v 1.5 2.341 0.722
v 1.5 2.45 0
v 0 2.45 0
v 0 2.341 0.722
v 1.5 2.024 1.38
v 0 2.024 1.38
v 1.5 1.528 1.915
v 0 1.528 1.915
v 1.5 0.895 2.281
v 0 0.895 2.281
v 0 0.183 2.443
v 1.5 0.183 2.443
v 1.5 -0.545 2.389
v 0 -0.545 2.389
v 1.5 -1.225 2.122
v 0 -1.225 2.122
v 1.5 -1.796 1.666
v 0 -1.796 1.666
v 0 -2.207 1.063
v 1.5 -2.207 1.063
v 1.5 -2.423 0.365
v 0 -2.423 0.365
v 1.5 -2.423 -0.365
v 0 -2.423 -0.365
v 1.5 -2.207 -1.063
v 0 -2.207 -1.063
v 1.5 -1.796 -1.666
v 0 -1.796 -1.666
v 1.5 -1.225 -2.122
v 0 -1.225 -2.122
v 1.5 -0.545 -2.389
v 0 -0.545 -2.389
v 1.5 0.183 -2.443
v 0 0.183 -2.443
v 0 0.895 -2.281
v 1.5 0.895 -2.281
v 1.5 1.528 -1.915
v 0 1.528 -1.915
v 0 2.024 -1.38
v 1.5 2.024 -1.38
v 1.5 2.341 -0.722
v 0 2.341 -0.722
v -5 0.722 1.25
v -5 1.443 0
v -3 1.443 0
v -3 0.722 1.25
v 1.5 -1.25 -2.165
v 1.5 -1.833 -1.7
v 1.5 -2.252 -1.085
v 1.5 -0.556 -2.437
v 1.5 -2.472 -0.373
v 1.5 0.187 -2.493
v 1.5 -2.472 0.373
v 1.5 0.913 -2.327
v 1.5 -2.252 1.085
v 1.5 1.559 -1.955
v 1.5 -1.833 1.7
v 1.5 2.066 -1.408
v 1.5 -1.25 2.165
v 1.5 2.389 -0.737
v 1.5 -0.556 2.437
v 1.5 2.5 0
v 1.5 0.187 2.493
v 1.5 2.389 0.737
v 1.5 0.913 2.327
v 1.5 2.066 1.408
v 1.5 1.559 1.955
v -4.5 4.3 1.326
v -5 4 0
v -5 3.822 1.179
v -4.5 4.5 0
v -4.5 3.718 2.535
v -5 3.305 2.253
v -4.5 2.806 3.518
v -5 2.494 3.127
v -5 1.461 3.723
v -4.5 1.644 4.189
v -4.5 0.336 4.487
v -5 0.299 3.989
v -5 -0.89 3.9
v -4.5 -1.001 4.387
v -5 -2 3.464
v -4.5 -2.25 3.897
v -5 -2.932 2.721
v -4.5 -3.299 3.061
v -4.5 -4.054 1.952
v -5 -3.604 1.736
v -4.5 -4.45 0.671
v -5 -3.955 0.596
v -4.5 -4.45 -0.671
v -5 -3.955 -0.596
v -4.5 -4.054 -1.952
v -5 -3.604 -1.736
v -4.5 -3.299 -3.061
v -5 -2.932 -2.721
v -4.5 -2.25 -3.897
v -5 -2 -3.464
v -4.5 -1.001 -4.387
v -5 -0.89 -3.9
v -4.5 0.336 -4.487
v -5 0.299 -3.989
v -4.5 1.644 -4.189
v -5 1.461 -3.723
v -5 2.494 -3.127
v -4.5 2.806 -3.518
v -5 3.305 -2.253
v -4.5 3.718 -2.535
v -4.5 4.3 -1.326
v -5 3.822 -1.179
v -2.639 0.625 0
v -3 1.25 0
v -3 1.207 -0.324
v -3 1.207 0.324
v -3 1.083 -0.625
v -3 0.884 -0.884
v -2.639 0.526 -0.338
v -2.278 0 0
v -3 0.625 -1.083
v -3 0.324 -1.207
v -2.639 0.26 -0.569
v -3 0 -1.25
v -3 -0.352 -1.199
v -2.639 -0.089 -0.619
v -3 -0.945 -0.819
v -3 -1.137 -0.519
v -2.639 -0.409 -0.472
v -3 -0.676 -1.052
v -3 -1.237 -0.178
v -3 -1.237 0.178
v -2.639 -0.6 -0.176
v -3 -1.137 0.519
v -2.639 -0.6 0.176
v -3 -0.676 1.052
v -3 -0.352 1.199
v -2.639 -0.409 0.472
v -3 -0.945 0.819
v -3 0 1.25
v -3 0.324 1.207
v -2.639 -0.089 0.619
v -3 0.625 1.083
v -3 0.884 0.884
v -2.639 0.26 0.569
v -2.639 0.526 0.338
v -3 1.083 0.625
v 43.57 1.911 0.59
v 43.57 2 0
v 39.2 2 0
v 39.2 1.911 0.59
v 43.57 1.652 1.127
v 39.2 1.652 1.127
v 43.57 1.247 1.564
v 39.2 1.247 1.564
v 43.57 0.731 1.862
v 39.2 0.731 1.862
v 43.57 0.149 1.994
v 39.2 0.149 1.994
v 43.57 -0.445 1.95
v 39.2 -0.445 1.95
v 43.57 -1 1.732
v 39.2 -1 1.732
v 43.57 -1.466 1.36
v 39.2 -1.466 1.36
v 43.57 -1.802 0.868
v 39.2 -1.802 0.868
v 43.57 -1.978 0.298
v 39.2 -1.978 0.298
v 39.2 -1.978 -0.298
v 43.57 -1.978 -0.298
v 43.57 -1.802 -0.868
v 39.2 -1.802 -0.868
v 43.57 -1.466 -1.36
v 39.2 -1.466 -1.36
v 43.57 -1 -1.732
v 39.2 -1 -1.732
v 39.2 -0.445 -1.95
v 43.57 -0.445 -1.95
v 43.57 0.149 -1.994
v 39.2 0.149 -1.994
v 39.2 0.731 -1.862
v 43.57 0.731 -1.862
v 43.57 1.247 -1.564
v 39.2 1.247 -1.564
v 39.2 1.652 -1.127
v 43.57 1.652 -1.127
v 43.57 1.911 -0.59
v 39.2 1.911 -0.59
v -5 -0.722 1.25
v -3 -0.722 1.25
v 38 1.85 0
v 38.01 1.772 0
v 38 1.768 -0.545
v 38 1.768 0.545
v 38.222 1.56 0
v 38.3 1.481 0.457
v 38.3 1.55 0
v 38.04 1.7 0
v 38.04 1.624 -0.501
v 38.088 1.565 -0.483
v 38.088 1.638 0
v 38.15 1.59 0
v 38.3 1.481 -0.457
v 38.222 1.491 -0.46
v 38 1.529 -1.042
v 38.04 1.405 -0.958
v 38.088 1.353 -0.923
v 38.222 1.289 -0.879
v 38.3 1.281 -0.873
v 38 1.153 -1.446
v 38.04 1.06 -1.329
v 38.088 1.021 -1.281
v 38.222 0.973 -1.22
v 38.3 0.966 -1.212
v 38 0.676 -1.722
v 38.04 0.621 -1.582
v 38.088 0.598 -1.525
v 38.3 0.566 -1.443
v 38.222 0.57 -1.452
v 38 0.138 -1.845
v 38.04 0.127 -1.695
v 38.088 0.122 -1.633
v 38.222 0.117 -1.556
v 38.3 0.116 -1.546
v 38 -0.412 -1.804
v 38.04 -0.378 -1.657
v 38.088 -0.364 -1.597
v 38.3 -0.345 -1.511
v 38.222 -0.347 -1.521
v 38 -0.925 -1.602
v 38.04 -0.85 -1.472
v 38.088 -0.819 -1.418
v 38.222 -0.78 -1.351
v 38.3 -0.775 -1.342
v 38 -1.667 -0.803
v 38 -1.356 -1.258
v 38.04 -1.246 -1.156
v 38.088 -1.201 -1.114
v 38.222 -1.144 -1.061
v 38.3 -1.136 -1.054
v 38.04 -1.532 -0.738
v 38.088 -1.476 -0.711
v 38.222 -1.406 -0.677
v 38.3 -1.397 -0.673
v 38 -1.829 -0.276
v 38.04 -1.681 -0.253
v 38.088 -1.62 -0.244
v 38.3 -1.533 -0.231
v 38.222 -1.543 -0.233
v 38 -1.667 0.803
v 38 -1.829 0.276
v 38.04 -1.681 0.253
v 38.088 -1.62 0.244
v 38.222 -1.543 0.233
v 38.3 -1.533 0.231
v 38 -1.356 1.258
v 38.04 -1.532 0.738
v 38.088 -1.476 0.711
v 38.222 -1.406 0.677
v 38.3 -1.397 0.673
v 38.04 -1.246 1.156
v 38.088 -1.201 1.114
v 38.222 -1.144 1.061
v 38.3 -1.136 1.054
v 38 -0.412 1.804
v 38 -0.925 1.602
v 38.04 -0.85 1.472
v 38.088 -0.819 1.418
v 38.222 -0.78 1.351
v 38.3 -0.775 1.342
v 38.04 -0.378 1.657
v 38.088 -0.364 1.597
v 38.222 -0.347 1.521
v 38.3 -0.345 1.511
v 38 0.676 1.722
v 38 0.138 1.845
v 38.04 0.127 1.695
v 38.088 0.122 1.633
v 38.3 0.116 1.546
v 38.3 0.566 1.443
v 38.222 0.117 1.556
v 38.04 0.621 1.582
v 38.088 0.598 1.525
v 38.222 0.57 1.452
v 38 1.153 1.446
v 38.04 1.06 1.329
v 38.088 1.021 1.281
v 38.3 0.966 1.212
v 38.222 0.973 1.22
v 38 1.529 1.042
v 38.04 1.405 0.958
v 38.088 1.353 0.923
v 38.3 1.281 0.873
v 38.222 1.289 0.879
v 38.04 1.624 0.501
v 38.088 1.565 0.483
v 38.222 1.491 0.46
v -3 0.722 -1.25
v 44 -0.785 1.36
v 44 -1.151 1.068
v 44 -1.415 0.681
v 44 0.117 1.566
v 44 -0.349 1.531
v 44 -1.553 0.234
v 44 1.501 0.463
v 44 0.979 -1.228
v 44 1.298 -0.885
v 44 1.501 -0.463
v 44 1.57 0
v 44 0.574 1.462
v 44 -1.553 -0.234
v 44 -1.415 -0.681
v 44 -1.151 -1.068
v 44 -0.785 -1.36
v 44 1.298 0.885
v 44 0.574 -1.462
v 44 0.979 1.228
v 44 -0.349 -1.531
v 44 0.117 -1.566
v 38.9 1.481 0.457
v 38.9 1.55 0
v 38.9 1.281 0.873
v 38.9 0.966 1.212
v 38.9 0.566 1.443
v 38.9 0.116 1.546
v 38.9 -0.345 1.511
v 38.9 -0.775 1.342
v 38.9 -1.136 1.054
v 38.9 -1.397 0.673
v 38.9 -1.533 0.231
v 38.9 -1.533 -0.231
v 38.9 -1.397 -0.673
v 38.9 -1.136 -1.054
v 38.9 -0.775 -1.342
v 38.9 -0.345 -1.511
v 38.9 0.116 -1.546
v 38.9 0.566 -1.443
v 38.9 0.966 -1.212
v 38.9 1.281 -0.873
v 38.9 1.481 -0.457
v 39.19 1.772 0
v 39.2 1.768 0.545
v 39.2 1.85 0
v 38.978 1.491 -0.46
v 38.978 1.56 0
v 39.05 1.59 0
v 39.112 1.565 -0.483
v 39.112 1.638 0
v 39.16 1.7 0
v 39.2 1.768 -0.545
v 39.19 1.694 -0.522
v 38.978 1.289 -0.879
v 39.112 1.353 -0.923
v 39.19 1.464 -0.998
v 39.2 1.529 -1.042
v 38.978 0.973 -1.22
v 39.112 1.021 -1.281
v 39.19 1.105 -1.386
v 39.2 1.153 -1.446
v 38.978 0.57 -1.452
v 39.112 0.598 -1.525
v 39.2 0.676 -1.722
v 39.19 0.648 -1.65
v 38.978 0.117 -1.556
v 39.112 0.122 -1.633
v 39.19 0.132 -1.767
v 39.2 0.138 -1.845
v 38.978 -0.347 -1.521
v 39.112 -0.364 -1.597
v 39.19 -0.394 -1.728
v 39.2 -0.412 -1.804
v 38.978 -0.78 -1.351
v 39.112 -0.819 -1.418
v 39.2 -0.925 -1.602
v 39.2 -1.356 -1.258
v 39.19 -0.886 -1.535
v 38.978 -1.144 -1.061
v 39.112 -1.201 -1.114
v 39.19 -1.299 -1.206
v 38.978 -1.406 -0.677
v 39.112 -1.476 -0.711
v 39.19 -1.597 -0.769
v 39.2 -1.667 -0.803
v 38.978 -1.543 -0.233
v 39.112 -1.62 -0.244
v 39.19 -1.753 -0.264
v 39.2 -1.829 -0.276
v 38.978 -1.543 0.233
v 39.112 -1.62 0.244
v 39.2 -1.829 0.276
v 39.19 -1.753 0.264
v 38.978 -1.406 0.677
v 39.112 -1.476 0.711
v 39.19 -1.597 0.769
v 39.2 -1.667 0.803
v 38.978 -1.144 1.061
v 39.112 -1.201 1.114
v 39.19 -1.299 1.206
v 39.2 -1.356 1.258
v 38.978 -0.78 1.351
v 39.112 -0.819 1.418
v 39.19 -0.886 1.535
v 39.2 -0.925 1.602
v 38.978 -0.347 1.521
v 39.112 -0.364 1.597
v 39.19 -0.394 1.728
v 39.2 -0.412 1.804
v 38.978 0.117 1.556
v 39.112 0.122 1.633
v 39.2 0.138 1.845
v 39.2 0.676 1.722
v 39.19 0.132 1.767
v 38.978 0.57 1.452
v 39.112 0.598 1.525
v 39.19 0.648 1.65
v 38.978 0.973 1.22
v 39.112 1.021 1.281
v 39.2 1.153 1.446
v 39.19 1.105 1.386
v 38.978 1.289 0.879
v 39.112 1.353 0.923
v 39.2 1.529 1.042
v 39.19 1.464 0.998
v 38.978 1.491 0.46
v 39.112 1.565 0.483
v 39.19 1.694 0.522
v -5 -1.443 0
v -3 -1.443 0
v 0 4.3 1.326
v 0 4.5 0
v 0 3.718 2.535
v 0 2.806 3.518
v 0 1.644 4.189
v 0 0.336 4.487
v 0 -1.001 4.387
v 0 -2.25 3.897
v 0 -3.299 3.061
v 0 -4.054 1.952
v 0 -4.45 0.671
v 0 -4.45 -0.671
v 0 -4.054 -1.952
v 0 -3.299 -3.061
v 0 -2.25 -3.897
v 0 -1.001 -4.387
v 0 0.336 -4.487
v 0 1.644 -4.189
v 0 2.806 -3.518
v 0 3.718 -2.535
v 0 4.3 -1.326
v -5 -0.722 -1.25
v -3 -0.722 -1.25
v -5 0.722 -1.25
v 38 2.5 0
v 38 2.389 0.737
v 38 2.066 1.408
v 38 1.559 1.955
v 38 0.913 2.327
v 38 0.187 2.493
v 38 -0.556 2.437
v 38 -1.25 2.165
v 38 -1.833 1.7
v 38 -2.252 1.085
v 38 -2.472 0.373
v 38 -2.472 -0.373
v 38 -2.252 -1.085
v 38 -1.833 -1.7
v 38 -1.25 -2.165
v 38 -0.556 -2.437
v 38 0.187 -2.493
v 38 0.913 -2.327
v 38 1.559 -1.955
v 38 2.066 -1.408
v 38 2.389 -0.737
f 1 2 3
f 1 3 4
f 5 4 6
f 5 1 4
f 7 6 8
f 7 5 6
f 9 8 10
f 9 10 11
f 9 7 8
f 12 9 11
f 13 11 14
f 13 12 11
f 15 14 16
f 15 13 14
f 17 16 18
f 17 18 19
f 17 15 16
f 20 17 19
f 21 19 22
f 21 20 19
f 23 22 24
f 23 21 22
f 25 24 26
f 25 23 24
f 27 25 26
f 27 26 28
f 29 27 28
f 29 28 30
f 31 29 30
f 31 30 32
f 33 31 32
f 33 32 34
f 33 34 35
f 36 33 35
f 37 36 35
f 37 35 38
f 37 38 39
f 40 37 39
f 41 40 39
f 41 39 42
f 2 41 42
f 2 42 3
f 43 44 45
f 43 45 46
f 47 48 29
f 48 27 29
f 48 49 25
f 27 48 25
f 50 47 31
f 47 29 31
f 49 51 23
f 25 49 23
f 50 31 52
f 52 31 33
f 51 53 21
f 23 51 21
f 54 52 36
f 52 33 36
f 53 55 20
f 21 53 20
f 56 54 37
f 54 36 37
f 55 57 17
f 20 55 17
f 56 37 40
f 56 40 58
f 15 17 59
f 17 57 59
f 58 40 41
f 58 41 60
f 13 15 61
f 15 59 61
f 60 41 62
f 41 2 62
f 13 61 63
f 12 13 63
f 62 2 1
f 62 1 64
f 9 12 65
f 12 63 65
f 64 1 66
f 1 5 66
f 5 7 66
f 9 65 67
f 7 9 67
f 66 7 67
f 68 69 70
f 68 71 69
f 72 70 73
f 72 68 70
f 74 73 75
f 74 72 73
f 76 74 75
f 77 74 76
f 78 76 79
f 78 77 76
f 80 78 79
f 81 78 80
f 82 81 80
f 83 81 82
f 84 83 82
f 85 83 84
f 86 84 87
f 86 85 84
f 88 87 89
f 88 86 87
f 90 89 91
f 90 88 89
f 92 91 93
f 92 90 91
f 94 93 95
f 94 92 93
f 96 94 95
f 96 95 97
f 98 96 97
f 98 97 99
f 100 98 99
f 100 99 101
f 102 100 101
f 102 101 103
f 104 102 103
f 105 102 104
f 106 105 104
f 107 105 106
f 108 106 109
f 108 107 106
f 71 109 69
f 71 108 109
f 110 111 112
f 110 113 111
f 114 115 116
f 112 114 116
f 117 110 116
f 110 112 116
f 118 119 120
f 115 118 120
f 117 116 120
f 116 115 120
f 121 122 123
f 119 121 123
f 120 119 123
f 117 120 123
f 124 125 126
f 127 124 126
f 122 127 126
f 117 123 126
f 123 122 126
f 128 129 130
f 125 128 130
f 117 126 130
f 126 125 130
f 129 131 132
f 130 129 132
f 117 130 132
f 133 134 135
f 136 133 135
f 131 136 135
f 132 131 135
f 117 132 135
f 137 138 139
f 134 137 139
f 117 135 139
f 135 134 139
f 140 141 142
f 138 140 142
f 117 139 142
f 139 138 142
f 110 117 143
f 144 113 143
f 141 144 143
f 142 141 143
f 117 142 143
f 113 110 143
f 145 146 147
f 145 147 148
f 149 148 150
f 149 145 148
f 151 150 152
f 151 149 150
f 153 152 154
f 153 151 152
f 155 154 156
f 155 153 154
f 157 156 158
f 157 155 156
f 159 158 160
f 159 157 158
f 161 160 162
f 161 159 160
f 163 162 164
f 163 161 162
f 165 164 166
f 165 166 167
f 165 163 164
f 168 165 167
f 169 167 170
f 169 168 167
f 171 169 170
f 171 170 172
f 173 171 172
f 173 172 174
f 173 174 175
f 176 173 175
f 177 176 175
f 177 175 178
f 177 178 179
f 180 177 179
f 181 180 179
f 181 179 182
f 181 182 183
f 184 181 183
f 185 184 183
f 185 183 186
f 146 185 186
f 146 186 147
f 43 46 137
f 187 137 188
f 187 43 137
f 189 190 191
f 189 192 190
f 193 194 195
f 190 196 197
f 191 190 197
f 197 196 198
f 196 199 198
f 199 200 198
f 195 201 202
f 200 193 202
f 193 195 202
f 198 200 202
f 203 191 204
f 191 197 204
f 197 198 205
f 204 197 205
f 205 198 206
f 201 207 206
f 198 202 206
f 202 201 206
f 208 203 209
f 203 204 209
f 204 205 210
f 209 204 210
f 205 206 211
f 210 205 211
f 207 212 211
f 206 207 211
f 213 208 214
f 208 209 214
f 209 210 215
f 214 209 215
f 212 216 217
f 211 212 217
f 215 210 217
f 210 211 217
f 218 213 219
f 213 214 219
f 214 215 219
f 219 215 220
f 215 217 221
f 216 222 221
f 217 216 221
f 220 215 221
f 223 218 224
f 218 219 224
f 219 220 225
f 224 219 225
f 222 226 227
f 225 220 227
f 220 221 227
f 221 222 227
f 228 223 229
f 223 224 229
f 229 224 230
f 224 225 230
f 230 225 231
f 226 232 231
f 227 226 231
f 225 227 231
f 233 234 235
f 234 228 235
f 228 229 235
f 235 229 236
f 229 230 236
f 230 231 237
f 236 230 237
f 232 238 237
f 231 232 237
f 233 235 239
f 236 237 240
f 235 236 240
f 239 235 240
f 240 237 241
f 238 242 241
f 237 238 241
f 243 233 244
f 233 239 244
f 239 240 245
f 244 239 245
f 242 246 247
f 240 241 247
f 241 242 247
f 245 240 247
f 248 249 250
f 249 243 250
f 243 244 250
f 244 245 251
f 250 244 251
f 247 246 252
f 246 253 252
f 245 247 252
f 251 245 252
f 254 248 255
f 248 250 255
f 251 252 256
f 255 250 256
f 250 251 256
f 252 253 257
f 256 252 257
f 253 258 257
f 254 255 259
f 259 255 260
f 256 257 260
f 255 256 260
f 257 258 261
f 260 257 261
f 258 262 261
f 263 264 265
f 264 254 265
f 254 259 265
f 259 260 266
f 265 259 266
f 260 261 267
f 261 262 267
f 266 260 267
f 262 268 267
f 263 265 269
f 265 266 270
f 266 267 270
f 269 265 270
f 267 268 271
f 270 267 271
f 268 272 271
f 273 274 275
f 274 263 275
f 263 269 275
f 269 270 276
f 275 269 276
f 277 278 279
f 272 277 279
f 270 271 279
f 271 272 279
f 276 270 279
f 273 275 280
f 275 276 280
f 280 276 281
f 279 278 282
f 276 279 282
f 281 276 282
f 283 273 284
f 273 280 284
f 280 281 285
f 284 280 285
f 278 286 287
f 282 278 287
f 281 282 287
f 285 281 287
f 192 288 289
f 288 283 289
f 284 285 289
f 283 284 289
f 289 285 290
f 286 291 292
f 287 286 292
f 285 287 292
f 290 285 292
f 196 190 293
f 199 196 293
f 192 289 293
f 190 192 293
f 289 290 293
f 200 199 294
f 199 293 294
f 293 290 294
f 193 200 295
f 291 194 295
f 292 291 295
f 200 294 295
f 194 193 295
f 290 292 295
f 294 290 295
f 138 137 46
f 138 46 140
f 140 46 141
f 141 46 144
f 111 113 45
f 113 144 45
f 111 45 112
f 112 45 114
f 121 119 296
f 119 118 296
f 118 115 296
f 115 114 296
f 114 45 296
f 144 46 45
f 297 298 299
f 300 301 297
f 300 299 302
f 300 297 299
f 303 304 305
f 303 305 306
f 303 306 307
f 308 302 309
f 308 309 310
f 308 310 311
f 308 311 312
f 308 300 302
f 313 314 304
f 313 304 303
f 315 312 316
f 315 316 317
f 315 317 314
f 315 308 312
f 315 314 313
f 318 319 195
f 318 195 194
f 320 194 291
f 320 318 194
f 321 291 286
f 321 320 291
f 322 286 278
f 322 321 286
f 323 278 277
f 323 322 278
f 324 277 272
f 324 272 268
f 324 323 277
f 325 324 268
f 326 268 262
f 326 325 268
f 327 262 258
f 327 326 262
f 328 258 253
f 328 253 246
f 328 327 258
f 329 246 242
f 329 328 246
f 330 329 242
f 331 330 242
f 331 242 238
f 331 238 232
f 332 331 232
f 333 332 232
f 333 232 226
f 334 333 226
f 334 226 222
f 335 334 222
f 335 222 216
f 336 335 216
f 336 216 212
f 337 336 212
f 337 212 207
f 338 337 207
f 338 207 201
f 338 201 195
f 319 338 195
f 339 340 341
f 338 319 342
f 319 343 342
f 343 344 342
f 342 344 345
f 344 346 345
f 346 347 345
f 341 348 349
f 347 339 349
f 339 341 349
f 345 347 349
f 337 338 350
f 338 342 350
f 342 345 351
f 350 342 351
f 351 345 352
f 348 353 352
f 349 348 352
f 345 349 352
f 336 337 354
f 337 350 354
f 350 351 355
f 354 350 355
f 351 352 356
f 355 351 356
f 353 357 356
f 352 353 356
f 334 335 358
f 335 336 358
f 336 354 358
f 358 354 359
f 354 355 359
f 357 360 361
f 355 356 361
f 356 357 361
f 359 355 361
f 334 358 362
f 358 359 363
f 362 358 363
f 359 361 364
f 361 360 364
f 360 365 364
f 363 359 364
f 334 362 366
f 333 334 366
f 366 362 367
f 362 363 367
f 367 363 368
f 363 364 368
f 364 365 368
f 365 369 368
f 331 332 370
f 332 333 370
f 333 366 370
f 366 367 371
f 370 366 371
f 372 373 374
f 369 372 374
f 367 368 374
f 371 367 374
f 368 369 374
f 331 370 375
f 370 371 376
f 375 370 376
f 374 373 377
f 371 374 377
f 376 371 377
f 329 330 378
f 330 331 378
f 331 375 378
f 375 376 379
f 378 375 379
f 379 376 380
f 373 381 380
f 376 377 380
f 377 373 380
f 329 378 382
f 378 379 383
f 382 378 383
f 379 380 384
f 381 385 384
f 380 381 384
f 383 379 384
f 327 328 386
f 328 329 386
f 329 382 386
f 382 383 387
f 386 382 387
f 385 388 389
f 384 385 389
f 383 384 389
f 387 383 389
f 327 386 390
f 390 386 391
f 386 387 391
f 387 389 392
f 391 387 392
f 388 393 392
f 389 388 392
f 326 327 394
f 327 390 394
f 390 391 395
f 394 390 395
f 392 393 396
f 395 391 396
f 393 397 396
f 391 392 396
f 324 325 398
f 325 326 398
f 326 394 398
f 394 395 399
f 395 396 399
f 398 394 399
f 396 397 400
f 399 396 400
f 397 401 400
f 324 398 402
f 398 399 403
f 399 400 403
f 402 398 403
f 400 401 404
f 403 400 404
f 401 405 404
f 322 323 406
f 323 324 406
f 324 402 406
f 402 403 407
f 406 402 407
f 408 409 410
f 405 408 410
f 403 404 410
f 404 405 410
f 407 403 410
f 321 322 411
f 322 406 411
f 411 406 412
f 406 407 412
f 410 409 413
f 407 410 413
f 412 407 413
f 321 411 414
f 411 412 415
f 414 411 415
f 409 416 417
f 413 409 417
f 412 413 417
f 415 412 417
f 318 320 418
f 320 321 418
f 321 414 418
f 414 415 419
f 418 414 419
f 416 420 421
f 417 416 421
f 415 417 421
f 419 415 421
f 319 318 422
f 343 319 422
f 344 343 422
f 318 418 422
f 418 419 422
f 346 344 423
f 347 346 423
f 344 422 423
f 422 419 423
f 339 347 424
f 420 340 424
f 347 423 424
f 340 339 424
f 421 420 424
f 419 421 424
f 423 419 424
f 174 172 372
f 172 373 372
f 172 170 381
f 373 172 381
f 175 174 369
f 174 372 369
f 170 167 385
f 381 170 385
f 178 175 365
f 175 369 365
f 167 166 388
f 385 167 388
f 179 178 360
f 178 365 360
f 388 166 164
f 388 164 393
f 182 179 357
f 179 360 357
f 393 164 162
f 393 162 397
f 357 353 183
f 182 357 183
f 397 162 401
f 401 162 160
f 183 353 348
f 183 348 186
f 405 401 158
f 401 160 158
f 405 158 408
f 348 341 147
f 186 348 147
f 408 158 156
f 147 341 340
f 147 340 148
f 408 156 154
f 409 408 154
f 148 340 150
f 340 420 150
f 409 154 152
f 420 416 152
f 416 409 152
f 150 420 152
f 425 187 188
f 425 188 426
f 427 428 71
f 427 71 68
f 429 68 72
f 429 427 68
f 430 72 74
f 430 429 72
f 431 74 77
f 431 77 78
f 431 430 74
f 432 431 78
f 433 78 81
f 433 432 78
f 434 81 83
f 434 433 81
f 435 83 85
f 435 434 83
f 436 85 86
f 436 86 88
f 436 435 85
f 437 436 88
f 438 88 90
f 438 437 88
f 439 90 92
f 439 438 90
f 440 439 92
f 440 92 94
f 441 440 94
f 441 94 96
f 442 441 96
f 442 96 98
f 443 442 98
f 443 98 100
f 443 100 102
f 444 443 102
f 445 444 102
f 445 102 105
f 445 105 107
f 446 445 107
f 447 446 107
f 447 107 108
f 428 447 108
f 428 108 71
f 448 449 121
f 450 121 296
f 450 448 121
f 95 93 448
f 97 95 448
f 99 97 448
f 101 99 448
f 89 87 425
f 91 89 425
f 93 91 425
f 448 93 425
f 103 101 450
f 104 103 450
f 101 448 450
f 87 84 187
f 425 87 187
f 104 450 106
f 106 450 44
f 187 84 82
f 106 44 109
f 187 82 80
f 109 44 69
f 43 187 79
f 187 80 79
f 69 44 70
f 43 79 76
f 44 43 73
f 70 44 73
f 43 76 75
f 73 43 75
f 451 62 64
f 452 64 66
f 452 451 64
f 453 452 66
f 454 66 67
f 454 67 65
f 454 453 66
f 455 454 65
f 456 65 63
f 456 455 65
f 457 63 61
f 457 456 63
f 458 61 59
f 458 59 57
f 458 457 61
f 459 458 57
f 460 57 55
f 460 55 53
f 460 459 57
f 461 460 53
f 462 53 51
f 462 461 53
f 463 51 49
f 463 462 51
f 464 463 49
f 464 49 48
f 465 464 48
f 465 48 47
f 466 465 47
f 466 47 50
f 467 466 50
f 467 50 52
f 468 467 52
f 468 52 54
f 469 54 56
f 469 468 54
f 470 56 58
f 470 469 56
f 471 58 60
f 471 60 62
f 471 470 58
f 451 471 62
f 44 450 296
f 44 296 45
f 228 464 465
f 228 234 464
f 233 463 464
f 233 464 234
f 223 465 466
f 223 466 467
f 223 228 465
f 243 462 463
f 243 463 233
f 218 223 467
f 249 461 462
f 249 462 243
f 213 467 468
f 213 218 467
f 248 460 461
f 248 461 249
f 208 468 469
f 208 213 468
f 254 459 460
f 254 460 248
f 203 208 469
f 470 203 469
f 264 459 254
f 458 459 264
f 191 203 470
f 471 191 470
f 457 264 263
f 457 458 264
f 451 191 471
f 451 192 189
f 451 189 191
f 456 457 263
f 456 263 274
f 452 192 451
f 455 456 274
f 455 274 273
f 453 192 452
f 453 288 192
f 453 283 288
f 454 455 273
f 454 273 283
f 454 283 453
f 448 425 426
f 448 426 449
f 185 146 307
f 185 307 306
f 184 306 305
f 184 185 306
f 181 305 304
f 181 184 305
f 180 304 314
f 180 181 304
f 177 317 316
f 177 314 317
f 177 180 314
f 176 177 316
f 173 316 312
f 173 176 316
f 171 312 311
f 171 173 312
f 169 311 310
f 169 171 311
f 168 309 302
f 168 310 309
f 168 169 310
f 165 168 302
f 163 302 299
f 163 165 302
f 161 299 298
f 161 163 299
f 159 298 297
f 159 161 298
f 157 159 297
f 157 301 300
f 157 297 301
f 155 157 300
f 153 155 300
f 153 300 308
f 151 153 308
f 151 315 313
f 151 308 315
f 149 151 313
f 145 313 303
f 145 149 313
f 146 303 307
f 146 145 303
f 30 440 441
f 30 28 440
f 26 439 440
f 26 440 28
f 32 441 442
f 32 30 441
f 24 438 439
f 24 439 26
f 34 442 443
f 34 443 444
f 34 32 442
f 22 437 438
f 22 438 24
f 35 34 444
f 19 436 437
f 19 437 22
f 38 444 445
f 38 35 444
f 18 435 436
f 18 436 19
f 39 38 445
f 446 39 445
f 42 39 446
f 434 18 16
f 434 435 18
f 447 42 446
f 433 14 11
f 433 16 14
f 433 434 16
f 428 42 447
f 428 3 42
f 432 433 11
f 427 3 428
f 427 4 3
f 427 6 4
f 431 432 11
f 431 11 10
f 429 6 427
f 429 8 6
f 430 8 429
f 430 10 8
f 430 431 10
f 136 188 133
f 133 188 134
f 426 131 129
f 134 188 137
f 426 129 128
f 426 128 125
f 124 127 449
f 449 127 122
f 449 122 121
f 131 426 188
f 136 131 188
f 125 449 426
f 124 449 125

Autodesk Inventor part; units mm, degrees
sketch "Sketch_1" plane through (0, 0, 0) normal (0, 0, 1) x (1, 0, 0)
  line L0 (44, 0) -> (-5, 0)
  line L1 (-2.2783, 0) -> (-3, 1.25)
  line L2 (-3, 1.25) -> (-5, 1.25)
  line L3 (-5, 1.25) -> (-5, 4)
  line L4 (-5, 4) -> (-4.5, 4.5)
  line L5 (-4.5, 4.5) -> (0, 4.5)
  line L6 (0, 4.5) -> (0, 2.45)
  line L7 (0, 2.45) -> (1.5, 2.45)
  line L8 (1.5, 2.45) -> (1.5, 2.5)
  line L9 (1.5, 2.5) -> (38, 2.5)
  line L10 (38, 2.5) -> (38, 1.85)
  arc A0 (38, 1.85) -> (38.3, 1.55) centre (38.3, 1.85) ccw
  line L11 (38.3, 1.55) -> (38.9, 1.55)
  arc A1 (38.9, 1.55) -> (39.2, 1.85) centre (38.9, 1.85) ccw
  line L12 (39.2, 1.85) -> (39.2, 2)
  line L13 (39.2, 2) -> (43.5705, 2)
  line L14 (43.5705, 2) -> (44, 1.5705)
  line L15 (44, 1.5705) -> (44, 0)
  line L16 (44, 0) -> (-2.2783, 0)
revolve "Revolution1" add sketch "Sketch_1" angle 360 about axis through (44, 0, 0) along (1, 0, 0)
thread "Thread1" size "M4x0.7" class "6g" standard "ISO Metric profile" full length
sketch "Sketch_2" plane through (-5, 0, 0) normal (1, 0, 0) x (0, 0, -1)
  line L0 (-1.25, -0.7217) -> (0, -1.4434)
  line L1 (0, -1.4434) -> (1.25, -0.7217)
  line L2 (1.25, -0.7217) -> (1.25, 0.7217)
  line L3 (1.25, 0.7217) -> (0, 1.4434)
  line L4 (0, 1.4434) -> (-1.25, 0.7217)
  line L5 (-1.25, 0.7217) -> (-1.25, -0.7217)
extrude "Extrusion1" cut sketch "Sketch_2" along normal blind 2
ref_plane "pin_to_nut_XY" through (39.7, 0, 0) normal (1, 0, 0) x (0, 0, -1)
ref_plane "pin_to_nut_YZ" through (39.7, 0, 0) normal (0, 0, -1) x (0, 1, 0)
ref_plane "pin_to_nut_ZX" through (39.7, 0, 0) normal (0, 1, 0) x (1, 0, 0)
properties part number "SCLBRU5-38.0_D"
